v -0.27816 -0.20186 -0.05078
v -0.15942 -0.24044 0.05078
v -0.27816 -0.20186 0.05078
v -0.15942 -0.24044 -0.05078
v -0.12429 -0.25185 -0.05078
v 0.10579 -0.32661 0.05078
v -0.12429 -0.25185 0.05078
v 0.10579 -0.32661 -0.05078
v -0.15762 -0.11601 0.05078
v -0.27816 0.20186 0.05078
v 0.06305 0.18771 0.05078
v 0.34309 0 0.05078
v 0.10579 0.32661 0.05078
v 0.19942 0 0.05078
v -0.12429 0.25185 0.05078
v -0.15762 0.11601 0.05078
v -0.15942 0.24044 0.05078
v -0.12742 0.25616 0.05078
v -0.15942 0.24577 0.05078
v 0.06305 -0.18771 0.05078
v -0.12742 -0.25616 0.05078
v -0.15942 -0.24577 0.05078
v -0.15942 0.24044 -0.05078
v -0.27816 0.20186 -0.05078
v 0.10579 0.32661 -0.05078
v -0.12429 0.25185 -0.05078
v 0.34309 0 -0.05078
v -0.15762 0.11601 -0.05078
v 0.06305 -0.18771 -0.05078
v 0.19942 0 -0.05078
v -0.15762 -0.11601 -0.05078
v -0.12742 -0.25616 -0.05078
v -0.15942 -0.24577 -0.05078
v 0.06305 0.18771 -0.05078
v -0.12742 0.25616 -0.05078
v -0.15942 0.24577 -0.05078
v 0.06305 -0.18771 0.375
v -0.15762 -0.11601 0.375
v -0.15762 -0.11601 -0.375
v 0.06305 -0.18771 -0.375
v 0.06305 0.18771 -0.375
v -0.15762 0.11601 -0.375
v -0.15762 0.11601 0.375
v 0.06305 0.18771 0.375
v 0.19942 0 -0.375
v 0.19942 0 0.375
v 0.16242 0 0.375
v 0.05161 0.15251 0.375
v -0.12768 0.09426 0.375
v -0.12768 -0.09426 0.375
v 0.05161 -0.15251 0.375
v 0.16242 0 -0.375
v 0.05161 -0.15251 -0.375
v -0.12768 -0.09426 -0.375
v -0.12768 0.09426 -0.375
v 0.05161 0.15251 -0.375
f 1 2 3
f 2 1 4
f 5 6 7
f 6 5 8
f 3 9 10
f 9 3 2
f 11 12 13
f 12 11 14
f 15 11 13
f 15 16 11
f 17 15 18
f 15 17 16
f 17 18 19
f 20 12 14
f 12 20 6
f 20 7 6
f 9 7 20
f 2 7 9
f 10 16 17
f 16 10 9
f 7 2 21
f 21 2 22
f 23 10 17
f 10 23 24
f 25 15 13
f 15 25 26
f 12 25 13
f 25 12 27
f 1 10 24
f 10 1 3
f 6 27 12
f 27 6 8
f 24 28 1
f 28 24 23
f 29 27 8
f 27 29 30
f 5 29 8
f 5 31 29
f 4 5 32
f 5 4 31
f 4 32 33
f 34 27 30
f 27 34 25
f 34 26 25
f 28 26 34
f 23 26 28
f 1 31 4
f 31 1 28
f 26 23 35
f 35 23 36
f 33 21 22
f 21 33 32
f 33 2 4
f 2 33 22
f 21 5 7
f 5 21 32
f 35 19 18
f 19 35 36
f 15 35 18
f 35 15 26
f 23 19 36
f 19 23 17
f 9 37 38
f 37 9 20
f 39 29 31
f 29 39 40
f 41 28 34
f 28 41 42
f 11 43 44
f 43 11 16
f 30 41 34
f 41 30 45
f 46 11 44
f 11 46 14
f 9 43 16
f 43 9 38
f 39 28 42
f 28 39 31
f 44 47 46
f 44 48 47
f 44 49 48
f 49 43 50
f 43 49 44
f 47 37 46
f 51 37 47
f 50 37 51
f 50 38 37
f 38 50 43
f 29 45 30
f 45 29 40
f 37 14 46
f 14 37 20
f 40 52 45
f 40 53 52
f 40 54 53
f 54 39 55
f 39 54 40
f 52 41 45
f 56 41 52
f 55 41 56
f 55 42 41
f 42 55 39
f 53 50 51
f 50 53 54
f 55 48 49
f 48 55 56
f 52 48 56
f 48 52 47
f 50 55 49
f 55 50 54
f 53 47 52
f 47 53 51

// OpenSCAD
EPS = 0.01;

module sketch0() {
    translate([-0.34375, 0, 0]) {
        difference() {
            union() {
                translate([0.34342105263157896, 0, 0])
                    cylinder(h=0.1015625, r=0.34342105263157896, center=true);
                translate([0.20748355263157894, -0.22894736842105262, 0])
                    cylinder(h=0.1015625, r=0.028618421052631578, center=true);
                translate([0.20748355263157894, 0.22894736842105262, 0])
                    cylinder(h=0.1015625, r=0.028618421052631578, center=true);
                translate([0.6009868421052631, 0, 0])
                    cylinder(h=0.1015625, r=0.028618421052631578, center=true);
            }
            translate([0.34342105263157896, 0, 0])
                cylinder(h=0.1015625 + EPS, r=0.19317434210526316, center=true);
        }
    }
}

module sketch1() {
    translate([-0.1953125, 0, 0]) {
        difference() {
            translate([0.19736842105263158, 0, 0])
                cylinder(h=0.75, r=0.19736842105263158, center=true);
            translate([0.19736842105263158, 0, 0])
                cylinder(h=0.75 + EPS, r=0.16036184210526314, center=true);
        }
    }
}

union() {
    sketch0();
    sketch1();
}
